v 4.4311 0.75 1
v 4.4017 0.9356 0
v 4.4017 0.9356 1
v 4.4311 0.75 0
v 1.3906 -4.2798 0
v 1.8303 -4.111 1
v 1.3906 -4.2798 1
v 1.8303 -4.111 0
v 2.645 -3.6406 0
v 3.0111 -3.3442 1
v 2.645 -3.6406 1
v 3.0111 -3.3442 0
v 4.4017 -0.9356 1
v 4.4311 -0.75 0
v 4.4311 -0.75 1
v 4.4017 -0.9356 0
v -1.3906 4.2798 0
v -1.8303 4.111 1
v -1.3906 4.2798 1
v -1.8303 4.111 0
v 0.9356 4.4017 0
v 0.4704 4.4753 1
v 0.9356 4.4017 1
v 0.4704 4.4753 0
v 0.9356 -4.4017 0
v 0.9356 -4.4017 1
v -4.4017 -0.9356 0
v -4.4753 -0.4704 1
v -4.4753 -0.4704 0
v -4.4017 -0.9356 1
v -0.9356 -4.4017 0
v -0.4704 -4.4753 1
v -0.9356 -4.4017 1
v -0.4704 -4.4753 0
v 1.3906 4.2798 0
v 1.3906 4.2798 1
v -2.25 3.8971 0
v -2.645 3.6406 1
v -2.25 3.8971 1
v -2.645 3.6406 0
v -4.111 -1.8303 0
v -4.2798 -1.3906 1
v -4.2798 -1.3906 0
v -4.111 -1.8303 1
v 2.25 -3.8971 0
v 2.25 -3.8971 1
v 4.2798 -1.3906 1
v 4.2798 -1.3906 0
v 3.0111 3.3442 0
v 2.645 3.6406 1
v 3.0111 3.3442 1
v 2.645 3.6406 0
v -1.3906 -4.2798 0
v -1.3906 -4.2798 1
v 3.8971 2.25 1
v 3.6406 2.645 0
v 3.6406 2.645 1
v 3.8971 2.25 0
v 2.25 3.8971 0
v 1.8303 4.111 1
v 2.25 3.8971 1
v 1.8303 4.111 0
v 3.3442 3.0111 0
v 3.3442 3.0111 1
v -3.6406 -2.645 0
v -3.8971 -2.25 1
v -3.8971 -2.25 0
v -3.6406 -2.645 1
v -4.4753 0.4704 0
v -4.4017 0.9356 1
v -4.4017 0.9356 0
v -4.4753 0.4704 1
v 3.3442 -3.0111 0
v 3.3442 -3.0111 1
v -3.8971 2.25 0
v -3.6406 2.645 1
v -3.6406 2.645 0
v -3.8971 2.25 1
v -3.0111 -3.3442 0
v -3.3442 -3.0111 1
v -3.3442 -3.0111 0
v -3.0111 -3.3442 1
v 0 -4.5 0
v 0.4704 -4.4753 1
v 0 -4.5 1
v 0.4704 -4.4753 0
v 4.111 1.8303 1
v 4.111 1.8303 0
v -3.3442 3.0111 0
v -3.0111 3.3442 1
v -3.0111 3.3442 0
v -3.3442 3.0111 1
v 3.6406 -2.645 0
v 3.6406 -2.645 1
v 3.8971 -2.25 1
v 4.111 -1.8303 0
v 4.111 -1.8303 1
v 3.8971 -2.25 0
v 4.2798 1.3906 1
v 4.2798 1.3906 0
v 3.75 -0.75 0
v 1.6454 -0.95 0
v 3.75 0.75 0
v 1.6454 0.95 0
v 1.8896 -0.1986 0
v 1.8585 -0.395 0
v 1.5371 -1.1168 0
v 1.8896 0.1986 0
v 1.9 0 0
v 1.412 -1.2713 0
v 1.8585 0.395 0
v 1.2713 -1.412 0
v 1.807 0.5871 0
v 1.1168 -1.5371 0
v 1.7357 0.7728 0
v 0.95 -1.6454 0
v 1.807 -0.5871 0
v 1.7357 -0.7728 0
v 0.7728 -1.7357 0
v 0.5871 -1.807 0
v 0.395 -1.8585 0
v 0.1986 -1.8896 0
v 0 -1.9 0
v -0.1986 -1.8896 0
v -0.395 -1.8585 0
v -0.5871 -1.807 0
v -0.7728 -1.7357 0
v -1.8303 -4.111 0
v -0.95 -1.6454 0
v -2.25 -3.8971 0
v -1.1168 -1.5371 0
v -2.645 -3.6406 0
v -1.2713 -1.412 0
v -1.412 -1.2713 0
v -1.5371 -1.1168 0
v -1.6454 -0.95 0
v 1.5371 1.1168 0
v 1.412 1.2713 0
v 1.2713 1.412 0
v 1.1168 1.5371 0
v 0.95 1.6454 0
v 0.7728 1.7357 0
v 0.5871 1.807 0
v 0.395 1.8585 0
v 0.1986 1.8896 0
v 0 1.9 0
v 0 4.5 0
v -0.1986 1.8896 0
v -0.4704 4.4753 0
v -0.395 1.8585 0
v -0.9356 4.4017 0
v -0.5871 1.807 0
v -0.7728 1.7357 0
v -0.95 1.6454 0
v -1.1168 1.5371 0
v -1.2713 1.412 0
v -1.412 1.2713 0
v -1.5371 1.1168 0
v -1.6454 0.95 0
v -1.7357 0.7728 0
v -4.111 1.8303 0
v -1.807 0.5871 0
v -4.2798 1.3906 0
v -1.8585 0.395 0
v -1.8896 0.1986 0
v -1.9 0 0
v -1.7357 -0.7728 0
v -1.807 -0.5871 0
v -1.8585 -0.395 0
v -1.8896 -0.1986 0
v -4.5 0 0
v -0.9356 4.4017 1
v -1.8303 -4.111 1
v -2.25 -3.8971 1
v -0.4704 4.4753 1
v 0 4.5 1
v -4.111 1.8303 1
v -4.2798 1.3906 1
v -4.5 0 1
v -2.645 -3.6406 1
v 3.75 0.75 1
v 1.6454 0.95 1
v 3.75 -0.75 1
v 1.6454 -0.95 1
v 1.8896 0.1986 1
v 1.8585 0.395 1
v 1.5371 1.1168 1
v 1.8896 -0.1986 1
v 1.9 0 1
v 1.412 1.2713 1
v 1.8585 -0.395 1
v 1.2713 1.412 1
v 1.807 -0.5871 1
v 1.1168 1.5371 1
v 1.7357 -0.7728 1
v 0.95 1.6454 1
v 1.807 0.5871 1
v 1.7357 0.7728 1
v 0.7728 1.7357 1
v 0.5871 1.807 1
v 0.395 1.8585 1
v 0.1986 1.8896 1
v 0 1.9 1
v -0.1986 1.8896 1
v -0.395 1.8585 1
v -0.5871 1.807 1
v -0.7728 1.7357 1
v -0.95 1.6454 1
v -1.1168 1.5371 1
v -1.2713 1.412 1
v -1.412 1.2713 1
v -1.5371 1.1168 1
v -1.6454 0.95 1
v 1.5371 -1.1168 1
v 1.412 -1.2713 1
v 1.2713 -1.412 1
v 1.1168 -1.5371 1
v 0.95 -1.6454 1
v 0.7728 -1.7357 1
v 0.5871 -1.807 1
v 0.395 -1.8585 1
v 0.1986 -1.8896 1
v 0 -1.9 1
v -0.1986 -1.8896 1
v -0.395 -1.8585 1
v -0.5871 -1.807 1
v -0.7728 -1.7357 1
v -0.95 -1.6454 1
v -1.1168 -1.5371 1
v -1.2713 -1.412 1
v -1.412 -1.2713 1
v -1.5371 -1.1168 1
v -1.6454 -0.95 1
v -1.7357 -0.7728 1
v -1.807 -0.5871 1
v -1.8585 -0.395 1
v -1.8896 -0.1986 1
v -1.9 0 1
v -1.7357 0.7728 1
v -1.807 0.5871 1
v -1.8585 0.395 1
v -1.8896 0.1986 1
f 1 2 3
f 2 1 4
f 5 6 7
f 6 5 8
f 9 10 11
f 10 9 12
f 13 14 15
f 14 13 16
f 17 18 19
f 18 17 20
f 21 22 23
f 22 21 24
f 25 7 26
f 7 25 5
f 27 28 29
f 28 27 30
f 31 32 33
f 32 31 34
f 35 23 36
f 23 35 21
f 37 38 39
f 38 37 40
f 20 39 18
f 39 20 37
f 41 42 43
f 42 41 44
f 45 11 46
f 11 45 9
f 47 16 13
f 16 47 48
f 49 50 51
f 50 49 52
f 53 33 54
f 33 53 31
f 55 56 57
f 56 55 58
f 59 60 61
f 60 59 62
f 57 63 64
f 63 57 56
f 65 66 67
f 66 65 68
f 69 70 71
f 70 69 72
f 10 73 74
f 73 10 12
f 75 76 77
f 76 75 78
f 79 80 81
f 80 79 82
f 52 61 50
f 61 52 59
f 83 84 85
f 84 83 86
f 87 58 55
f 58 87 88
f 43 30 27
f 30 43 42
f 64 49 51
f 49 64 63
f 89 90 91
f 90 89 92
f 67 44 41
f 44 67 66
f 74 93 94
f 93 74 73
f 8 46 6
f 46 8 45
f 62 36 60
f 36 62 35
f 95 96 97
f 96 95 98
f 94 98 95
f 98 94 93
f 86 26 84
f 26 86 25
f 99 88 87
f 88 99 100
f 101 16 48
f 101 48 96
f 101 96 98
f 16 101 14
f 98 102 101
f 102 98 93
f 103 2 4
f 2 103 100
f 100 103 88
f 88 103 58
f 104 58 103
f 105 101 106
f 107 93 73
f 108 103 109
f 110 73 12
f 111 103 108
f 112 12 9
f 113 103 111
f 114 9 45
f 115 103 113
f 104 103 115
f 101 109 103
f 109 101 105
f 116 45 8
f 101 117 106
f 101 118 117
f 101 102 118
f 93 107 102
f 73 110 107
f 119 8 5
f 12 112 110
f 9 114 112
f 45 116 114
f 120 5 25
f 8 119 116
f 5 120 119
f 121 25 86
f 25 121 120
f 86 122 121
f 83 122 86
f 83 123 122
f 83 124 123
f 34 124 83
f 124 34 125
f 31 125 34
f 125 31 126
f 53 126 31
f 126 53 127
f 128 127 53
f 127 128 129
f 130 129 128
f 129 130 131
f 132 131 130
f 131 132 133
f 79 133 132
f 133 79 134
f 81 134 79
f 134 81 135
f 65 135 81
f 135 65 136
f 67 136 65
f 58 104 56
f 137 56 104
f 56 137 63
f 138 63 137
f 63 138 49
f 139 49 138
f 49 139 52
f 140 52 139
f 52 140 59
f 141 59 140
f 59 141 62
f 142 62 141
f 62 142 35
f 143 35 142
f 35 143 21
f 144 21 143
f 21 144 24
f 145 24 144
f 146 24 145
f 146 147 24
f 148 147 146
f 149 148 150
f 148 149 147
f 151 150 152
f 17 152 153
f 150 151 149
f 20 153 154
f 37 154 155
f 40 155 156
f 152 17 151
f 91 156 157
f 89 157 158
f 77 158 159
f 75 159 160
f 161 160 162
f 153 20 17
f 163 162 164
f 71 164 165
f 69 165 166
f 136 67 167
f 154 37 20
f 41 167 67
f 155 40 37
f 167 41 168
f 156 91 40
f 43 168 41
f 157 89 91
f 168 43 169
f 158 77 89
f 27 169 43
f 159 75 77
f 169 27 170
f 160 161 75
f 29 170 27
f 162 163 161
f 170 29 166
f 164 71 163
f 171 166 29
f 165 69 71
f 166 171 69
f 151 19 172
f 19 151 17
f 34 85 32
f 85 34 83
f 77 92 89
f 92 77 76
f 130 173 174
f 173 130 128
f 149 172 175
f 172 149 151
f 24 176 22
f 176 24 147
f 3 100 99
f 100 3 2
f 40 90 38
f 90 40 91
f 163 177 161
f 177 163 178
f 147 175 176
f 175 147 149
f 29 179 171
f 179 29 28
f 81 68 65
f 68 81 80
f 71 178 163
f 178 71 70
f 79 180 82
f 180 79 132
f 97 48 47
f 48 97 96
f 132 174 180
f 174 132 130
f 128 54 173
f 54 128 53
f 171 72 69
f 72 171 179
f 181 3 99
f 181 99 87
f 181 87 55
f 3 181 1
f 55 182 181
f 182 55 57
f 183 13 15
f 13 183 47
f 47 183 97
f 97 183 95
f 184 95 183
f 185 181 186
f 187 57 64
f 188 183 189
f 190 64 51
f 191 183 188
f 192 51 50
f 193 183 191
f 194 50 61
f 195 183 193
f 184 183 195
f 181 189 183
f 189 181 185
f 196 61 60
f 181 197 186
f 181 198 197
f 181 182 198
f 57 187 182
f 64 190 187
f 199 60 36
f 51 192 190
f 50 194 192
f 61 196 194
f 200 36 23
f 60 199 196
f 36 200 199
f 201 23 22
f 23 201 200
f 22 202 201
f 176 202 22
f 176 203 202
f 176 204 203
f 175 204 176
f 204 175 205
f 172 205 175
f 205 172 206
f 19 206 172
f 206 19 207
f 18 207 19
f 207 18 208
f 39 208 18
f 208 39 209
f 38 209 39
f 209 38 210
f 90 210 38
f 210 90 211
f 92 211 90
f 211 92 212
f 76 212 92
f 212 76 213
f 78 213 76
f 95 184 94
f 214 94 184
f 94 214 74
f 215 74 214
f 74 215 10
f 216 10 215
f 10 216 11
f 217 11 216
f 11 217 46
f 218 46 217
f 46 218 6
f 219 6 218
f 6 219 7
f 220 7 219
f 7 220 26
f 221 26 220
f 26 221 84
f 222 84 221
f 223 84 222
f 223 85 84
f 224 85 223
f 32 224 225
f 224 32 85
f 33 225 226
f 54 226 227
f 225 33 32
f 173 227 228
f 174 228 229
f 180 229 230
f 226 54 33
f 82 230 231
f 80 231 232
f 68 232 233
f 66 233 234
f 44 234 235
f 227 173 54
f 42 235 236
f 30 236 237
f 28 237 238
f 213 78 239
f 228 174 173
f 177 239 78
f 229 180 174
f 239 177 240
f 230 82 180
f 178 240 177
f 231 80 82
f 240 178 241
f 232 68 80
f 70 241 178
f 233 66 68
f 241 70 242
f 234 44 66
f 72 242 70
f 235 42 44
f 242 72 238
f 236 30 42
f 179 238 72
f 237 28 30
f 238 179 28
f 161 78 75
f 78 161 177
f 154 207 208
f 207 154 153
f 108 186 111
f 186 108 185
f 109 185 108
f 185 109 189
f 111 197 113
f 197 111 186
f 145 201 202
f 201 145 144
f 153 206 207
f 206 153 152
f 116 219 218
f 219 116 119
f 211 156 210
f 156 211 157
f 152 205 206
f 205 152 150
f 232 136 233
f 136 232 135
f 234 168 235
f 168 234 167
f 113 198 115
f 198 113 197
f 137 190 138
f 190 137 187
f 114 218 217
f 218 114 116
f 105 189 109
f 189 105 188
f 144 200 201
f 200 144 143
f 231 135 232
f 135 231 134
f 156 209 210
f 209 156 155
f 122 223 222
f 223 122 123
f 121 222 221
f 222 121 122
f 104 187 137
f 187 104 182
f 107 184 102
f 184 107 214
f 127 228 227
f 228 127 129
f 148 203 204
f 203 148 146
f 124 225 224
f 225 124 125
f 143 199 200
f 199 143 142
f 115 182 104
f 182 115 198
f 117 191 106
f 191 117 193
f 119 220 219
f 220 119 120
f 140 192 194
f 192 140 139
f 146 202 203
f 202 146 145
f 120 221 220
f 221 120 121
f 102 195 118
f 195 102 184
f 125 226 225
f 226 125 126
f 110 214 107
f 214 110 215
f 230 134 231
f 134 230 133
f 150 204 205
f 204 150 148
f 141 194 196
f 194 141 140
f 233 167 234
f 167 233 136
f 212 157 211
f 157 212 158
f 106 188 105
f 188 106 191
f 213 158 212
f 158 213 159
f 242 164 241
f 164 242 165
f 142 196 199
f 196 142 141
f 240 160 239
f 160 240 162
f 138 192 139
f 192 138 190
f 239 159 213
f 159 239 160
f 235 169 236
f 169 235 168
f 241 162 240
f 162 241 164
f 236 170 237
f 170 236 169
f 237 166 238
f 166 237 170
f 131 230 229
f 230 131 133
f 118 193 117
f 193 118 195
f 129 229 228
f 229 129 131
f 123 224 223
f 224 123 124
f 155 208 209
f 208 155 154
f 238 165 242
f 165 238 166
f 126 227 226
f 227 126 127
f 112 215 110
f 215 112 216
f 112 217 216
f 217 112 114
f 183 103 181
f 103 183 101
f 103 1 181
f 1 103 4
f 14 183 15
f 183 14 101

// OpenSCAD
// Split lock washer.
$fn = 60;
eps = 0.02;
inner_d = 3.8;
outer_d = 9;
thickness = 1;
gap = 1.5;
difference() {
    cylinder(d=outer_d,h=thickness);
    translate([0,0,-eps]) cylinder(d=inner_d,h=thickness+2*eps);
    translate([outer_d/2-gap/2,-gap/2,-eps]) cube([gap+eps,gap,thickness+2*eps]);
}
